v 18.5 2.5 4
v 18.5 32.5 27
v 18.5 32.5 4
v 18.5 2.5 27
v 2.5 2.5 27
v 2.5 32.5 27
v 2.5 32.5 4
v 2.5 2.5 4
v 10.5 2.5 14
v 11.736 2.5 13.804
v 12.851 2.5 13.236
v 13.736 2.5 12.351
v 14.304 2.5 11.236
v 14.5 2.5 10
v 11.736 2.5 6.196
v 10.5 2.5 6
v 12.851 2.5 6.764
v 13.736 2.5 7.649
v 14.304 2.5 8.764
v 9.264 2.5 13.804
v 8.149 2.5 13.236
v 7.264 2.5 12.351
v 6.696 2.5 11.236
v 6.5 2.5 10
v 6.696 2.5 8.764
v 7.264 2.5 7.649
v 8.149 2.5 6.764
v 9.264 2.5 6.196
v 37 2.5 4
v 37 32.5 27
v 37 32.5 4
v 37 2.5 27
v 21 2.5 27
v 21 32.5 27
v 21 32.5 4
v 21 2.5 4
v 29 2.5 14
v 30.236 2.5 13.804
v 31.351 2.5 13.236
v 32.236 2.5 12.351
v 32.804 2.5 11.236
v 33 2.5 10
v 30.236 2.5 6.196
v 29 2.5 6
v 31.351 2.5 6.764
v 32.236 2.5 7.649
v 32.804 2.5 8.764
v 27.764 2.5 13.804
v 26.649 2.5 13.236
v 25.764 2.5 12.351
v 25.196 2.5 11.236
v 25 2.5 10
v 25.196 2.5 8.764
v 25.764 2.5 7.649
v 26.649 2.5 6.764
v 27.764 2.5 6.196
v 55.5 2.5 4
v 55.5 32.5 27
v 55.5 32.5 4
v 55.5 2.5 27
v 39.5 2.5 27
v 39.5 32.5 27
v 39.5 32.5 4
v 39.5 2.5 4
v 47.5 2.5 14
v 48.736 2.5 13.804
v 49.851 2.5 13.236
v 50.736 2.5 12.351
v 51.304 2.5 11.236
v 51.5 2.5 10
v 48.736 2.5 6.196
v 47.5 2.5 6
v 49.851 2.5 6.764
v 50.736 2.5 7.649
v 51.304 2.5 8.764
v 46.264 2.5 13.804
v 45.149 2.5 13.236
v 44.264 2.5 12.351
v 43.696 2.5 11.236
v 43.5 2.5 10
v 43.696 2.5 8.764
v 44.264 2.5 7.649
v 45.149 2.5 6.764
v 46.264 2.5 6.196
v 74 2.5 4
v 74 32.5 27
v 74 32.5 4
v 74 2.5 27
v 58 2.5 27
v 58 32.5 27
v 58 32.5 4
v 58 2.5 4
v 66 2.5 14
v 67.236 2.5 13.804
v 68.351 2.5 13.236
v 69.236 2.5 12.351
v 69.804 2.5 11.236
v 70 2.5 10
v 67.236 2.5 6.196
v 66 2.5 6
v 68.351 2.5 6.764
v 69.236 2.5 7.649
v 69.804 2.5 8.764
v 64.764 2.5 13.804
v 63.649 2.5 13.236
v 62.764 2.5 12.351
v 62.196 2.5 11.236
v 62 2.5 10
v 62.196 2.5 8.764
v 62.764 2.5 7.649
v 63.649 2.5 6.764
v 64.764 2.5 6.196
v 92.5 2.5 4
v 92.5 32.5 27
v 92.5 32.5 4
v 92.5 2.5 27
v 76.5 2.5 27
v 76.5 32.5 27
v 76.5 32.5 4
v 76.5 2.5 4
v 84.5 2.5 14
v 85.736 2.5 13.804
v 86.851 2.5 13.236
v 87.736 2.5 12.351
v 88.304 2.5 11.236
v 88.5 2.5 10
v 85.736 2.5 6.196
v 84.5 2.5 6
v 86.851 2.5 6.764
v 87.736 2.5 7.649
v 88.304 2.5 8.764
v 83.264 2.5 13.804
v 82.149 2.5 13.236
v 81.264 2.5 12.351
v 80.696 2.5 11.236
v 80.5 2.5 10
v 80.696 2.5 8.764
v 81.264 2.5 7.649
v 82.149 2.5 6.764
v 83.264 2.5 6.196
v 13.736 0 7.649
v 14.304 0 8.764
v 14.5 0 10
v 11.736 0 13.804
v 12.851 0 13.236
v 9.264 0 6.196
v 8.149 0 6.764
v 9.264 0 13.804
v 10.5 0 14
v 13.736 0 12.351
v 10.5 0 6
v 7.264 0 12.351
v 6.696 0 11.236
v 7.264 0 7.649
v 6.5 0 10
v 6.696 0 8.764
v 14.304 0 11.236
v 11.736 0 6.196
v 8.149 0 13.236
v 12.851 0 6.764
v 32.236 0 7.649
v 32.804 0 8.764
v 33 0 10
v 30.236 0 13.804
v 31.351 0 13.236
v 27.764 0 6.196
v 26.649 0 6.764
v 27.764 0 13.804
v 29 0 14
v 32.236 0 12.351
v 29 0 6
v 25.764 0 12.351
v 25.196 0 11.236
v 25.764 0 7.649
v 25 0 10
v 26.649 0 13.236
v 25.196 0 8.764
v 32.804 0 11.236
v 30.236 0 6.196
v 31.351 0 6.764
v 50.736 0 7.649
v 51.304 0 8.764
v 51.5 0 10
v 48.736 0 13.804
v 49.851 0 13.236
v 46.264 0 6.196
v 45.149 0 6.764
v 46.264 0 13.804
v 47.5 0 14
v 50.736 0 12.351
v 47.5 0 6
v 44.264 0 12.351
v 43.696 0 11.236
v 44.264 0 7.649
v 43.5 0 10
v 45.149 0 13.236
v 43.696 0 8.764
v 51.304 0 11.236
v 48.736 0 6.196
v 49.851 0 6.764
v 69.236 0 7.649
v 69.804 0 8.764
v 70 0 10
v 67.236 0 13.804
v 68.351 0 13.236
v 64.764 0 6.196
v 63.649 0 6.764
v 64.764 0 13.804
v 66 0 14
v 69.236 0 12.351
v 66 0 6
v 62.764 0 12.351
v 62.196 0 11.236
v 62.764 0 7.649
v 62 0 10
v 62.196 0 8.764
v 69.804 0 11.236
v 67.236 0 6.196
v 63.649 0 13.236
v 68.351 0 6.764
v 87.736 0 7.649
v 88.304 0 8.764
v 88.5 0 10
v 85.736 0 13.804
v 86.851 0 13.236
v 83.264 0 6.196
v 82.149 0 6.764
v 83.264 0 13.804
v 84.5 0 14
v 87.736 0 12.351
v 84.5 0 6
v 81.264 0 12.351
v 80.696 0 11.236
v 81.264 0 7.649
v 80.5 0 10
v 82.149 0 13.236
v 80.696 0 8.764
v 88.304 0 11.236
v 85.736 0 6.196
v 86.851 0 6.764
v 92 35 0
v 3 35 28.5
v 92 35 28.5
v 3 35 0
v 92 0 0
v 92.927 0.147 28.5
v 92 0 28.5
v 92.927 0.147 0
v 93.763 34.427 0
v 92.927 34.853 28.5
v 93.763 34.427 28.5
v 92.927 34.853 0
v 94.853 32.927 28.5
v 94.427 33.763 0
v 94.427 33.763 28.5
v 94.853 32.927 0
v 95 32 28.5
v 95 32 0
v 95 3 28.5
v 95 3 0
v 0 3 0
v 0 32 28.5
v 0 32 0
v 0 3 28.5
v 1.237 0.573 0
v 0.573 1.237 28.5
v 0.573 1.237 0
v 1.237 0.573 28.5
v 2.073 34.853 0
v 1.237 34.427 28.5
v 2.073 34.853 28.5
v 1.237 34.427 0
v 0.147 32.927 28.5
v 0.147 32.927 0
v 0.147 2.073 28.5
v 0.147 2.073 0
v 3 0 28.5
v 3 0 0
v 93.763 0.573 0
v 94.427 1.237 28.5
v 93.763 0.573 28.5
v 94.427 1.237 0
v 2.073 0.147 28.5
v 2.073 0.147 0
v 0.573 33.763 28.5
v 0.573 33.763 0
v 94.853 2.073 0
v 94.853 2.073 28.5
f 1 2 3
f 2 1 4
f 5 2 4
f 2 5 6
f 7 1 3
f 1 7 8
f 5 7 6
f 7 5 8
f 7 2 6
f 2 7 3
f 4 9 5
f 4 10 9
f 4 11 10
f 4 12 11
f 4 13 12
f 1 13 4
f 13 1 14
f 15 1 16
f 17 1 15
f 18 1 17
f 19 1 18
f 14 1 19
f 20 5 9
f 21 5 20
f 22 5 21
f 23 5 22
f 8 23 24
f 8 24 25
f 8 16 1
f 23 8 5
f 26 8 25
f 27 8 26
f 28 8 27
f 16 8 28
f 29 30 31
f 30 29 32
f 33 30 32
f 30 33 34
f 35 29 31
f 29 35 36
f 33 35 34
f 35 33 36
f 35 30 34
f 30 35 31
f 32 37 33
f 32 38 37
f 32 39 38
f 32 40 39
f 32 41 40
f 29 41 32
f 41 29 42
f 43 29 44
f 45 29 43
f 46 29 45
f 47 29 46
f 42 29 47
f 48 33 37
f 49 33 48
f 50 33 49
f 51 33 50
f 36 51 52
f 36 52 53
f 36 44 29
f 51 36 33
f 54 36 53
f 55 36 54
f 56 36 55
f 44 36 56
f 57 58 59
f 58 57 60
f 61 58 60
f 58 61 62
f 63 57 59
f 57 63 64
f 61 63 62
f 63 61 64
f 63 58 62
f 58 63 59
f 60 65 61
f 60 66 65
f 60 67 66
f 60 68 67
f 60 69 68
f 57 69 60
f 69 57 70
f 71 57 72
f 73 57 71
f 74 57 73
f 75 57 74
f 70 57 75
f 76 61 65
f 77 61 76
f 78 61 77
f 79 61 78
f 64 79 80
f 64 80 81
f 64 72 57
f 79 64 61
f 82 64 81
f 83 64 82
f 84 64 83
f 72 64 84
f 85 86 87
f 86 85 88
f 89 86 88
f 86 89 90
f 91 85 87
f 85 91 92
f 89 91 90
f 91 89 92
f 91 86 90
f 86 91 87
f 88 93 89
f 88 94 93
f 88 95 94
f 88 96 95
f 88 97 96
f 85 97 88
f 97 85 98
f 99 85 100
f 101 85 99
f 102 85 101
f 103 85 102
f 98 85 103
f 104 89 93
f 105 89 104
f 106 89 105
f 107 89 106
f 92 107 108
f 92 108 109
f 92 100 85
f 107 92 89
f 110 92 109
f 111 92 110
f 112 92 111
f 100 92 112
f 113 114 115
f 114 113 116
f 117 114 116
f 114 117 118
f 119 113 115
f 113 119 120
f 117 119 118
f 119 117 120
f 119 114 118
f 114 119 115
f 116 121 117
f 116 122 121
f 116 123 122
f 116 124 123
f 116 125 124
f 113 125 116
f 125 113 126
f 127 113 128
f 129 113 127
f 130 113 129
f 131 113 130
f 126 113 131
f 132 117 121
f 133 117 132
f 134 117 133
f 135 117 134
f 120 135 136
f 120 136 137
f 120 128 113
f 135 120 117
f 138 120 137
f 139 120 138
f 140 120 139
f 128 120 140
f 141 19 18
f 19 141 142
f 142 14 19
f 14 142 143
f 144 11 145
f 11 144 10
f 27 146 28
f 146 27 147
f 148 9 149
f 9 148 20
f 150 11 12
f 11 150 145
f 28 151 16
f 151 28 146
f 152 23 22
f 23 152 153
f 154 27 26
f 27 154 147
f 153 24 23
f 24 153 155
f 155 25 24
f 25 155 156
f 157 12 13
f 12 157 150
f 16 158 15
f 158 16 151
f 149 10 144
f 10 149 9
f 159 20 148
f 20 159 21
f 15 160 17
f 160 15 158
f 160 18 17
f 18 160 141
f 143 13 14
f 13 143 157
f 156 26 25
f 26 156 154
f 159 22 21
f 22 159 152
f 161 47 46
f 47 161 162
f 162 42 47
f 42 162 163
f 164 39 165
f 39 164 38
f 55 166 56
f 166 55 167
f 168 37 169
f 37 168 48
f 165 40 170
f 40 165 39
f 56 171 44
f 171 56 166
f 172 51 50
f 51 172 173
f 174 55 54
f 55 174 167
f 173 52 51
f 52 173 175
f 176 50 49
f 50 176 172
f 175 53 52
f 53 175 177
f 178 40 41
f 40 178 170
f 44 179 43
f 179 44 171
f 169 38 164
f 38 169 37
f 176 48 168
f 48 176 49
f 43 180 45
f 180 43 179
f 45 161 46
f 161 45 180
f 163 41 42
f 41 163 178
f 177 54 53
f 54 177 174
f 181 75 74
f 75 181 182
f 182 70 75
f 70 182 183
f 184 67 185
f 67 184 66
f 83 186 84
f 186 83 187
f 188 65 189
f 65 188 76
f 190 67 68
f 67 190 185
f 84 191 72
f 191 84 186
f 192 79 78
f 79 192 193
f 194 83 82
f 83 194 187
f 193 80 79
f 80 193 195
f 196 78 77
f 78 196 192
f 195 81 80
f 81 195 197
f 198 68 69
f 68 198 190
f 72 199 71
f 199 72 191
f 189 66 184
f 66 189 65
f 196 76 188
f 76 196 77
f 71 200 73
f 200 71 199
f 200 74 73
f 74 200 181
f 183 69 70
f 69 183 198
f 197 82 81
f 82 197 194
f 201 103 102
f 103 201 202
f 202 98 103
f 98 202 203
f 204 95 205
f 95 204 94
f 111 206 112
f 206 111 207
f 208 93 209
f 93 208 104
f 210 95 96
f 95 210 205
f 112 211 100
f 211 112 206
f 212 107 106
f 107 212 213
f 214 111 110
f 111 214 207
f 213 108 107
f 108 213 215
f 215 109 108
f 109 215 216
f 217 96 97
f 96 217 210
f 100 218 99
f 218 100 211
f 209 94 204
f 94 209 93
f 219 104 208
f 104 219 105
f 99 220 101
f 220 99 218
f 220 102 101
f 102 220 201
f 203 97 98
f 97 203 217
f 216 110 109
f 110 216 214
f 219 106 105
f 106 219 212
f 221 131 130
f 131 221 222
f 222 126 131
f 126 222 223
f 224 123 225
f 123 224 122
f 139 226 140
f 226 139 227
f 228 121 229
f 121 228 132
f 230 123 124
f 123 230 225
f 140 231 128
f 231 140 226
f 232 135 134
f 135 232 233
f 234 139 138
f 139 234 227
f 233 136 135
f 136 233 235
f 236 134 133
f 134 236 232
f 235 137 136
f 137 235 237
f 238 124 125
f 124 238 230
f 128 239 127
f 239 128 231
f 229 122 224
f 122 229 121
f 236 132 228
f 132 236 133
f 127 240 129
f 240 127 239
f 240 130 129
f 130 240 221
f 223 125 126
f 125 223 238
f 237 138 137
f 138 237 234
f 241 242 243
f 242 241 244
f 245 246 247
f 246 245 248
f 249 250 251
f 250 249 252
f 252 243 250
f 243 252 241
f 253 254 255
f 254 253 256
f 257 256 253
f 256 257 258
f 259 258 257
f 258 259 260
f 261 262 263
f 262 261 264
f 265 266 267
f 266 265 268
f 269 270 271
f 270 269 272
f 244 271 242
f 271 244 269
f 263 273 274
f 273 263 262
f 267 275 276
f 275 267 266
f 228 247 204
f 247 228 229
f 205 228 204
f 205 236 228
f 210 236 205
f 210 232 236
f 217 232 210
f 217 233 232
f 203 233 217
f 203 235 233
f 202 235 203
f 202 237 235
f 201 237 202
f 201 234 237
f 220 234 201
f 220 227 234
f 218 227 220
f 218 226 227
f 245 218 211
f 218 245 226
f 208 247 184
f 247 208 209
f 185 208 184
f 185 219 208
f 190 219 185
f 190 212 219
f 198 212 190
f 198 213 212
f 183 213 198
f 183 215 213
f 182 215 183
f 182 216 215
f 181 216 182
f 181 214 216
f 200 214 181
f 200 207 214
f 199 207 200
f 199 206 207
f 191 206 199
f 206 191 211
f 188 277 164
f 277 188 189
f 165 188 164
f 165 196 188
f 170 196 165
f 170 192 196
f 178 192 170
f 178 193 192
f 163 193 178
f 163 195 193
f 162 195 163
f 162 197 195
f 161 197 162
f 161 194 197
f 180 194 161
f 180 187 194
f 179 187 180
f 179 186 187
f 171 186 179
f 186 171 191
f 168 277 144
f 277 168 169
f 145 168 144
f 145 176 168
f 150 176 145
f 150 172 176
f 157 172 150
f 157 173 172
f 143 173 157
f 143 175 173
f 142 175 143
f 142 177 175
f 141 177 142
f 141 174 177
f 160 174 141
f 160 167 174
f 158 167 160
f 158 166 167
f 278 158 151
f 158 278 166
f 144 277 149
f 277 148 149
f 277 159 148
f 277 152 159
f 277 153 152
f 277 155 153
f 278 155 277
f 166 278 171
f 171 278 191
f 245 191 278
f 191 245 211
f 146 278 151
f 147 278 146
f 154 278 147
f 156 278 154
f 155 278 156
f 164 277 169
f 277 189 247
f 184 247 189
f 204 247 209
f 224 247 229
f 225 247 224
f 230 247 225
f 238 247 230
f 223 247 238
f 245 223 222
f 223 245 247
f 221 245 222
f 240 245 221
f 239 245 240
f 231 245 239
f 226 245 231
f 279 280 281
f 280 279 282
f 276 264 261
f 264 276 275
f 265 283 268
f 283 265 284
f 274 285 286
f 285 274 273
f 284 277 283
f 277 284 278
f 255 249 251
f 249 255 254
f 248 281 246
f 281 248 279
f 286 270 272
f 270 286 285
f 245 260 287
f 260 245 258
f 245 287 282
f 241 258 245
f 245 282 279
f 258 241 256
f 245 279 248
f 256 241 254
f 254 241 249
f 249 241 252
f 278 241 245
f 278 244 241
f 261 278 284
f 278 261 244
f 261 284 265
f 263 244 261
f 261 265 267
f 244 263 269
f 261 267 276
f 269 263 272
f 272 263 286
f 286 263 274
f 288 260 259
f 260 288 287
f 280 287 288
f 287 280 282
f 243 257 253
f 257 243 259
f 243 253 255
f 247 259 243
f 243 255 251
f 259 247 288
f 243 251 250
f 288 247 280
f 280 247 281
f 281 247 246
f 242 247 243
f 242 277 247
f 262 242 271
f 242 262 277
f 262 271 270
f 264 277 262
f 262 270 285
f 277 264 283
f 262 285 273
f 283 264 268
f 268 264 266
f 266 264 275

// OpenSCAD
// Desk Cable Organizer - 5 slots
// Top seller: $8-15 on Etsy
// Print: 0.2mm, 3 walls, 15% infill, no supports

SLOTS     = 5;
SLOT_W    = 16;
SLOT_H    = 22;
SLOT_D    = 30;
WALL_T    = 2.5;
BASE_H    = 4;
CABLE_D   = 8;    // Cable hole diameter
ROUND_R   = 3;    // Corner rounding

total_W = SLOTS * (SLOT_W + WALL_T) + WALL_T;
total_D = SLOT_D + 2 * WALL_T;
total_H = BASE_H + SLOT_H + WALL_T;

module rounded_box(w, d, h, r) {
    hull() {
        for (x = [r, w-r], y = [r, d-r])
            translate([x, y, 0]) cylinder(r = r, h = h, $fn = 20);
    }
}

module organizer() {
    difference() {
        rounded_box(total_W, total_D, total_H, ROUND_R);

        // Slot cutouts
        for (i = [0 : SLOTS - 1]) {
            x = WALL_T + i * (SLOT_W + WALL_T);
            translate([x, WALL_T, BASE_H])
                cube([SLOT_W, SLOT_D, SLOT_H + 1]);
        }

        // Cable holes on front face
        for (i = [0 : SLOTS - 1]) {
            cx = WALL_T + i * (SLOT_W + WALL_T) + SLOT_W/2;
            translate([cx, -1, BASE_H + CABLE_D/2 + 2])
                rotate([-90, 0, 0])
                    cylinder(d = CABLE_D, h = WALL_T + 2, $fn = 20);
        }
    }
}

organizer();
